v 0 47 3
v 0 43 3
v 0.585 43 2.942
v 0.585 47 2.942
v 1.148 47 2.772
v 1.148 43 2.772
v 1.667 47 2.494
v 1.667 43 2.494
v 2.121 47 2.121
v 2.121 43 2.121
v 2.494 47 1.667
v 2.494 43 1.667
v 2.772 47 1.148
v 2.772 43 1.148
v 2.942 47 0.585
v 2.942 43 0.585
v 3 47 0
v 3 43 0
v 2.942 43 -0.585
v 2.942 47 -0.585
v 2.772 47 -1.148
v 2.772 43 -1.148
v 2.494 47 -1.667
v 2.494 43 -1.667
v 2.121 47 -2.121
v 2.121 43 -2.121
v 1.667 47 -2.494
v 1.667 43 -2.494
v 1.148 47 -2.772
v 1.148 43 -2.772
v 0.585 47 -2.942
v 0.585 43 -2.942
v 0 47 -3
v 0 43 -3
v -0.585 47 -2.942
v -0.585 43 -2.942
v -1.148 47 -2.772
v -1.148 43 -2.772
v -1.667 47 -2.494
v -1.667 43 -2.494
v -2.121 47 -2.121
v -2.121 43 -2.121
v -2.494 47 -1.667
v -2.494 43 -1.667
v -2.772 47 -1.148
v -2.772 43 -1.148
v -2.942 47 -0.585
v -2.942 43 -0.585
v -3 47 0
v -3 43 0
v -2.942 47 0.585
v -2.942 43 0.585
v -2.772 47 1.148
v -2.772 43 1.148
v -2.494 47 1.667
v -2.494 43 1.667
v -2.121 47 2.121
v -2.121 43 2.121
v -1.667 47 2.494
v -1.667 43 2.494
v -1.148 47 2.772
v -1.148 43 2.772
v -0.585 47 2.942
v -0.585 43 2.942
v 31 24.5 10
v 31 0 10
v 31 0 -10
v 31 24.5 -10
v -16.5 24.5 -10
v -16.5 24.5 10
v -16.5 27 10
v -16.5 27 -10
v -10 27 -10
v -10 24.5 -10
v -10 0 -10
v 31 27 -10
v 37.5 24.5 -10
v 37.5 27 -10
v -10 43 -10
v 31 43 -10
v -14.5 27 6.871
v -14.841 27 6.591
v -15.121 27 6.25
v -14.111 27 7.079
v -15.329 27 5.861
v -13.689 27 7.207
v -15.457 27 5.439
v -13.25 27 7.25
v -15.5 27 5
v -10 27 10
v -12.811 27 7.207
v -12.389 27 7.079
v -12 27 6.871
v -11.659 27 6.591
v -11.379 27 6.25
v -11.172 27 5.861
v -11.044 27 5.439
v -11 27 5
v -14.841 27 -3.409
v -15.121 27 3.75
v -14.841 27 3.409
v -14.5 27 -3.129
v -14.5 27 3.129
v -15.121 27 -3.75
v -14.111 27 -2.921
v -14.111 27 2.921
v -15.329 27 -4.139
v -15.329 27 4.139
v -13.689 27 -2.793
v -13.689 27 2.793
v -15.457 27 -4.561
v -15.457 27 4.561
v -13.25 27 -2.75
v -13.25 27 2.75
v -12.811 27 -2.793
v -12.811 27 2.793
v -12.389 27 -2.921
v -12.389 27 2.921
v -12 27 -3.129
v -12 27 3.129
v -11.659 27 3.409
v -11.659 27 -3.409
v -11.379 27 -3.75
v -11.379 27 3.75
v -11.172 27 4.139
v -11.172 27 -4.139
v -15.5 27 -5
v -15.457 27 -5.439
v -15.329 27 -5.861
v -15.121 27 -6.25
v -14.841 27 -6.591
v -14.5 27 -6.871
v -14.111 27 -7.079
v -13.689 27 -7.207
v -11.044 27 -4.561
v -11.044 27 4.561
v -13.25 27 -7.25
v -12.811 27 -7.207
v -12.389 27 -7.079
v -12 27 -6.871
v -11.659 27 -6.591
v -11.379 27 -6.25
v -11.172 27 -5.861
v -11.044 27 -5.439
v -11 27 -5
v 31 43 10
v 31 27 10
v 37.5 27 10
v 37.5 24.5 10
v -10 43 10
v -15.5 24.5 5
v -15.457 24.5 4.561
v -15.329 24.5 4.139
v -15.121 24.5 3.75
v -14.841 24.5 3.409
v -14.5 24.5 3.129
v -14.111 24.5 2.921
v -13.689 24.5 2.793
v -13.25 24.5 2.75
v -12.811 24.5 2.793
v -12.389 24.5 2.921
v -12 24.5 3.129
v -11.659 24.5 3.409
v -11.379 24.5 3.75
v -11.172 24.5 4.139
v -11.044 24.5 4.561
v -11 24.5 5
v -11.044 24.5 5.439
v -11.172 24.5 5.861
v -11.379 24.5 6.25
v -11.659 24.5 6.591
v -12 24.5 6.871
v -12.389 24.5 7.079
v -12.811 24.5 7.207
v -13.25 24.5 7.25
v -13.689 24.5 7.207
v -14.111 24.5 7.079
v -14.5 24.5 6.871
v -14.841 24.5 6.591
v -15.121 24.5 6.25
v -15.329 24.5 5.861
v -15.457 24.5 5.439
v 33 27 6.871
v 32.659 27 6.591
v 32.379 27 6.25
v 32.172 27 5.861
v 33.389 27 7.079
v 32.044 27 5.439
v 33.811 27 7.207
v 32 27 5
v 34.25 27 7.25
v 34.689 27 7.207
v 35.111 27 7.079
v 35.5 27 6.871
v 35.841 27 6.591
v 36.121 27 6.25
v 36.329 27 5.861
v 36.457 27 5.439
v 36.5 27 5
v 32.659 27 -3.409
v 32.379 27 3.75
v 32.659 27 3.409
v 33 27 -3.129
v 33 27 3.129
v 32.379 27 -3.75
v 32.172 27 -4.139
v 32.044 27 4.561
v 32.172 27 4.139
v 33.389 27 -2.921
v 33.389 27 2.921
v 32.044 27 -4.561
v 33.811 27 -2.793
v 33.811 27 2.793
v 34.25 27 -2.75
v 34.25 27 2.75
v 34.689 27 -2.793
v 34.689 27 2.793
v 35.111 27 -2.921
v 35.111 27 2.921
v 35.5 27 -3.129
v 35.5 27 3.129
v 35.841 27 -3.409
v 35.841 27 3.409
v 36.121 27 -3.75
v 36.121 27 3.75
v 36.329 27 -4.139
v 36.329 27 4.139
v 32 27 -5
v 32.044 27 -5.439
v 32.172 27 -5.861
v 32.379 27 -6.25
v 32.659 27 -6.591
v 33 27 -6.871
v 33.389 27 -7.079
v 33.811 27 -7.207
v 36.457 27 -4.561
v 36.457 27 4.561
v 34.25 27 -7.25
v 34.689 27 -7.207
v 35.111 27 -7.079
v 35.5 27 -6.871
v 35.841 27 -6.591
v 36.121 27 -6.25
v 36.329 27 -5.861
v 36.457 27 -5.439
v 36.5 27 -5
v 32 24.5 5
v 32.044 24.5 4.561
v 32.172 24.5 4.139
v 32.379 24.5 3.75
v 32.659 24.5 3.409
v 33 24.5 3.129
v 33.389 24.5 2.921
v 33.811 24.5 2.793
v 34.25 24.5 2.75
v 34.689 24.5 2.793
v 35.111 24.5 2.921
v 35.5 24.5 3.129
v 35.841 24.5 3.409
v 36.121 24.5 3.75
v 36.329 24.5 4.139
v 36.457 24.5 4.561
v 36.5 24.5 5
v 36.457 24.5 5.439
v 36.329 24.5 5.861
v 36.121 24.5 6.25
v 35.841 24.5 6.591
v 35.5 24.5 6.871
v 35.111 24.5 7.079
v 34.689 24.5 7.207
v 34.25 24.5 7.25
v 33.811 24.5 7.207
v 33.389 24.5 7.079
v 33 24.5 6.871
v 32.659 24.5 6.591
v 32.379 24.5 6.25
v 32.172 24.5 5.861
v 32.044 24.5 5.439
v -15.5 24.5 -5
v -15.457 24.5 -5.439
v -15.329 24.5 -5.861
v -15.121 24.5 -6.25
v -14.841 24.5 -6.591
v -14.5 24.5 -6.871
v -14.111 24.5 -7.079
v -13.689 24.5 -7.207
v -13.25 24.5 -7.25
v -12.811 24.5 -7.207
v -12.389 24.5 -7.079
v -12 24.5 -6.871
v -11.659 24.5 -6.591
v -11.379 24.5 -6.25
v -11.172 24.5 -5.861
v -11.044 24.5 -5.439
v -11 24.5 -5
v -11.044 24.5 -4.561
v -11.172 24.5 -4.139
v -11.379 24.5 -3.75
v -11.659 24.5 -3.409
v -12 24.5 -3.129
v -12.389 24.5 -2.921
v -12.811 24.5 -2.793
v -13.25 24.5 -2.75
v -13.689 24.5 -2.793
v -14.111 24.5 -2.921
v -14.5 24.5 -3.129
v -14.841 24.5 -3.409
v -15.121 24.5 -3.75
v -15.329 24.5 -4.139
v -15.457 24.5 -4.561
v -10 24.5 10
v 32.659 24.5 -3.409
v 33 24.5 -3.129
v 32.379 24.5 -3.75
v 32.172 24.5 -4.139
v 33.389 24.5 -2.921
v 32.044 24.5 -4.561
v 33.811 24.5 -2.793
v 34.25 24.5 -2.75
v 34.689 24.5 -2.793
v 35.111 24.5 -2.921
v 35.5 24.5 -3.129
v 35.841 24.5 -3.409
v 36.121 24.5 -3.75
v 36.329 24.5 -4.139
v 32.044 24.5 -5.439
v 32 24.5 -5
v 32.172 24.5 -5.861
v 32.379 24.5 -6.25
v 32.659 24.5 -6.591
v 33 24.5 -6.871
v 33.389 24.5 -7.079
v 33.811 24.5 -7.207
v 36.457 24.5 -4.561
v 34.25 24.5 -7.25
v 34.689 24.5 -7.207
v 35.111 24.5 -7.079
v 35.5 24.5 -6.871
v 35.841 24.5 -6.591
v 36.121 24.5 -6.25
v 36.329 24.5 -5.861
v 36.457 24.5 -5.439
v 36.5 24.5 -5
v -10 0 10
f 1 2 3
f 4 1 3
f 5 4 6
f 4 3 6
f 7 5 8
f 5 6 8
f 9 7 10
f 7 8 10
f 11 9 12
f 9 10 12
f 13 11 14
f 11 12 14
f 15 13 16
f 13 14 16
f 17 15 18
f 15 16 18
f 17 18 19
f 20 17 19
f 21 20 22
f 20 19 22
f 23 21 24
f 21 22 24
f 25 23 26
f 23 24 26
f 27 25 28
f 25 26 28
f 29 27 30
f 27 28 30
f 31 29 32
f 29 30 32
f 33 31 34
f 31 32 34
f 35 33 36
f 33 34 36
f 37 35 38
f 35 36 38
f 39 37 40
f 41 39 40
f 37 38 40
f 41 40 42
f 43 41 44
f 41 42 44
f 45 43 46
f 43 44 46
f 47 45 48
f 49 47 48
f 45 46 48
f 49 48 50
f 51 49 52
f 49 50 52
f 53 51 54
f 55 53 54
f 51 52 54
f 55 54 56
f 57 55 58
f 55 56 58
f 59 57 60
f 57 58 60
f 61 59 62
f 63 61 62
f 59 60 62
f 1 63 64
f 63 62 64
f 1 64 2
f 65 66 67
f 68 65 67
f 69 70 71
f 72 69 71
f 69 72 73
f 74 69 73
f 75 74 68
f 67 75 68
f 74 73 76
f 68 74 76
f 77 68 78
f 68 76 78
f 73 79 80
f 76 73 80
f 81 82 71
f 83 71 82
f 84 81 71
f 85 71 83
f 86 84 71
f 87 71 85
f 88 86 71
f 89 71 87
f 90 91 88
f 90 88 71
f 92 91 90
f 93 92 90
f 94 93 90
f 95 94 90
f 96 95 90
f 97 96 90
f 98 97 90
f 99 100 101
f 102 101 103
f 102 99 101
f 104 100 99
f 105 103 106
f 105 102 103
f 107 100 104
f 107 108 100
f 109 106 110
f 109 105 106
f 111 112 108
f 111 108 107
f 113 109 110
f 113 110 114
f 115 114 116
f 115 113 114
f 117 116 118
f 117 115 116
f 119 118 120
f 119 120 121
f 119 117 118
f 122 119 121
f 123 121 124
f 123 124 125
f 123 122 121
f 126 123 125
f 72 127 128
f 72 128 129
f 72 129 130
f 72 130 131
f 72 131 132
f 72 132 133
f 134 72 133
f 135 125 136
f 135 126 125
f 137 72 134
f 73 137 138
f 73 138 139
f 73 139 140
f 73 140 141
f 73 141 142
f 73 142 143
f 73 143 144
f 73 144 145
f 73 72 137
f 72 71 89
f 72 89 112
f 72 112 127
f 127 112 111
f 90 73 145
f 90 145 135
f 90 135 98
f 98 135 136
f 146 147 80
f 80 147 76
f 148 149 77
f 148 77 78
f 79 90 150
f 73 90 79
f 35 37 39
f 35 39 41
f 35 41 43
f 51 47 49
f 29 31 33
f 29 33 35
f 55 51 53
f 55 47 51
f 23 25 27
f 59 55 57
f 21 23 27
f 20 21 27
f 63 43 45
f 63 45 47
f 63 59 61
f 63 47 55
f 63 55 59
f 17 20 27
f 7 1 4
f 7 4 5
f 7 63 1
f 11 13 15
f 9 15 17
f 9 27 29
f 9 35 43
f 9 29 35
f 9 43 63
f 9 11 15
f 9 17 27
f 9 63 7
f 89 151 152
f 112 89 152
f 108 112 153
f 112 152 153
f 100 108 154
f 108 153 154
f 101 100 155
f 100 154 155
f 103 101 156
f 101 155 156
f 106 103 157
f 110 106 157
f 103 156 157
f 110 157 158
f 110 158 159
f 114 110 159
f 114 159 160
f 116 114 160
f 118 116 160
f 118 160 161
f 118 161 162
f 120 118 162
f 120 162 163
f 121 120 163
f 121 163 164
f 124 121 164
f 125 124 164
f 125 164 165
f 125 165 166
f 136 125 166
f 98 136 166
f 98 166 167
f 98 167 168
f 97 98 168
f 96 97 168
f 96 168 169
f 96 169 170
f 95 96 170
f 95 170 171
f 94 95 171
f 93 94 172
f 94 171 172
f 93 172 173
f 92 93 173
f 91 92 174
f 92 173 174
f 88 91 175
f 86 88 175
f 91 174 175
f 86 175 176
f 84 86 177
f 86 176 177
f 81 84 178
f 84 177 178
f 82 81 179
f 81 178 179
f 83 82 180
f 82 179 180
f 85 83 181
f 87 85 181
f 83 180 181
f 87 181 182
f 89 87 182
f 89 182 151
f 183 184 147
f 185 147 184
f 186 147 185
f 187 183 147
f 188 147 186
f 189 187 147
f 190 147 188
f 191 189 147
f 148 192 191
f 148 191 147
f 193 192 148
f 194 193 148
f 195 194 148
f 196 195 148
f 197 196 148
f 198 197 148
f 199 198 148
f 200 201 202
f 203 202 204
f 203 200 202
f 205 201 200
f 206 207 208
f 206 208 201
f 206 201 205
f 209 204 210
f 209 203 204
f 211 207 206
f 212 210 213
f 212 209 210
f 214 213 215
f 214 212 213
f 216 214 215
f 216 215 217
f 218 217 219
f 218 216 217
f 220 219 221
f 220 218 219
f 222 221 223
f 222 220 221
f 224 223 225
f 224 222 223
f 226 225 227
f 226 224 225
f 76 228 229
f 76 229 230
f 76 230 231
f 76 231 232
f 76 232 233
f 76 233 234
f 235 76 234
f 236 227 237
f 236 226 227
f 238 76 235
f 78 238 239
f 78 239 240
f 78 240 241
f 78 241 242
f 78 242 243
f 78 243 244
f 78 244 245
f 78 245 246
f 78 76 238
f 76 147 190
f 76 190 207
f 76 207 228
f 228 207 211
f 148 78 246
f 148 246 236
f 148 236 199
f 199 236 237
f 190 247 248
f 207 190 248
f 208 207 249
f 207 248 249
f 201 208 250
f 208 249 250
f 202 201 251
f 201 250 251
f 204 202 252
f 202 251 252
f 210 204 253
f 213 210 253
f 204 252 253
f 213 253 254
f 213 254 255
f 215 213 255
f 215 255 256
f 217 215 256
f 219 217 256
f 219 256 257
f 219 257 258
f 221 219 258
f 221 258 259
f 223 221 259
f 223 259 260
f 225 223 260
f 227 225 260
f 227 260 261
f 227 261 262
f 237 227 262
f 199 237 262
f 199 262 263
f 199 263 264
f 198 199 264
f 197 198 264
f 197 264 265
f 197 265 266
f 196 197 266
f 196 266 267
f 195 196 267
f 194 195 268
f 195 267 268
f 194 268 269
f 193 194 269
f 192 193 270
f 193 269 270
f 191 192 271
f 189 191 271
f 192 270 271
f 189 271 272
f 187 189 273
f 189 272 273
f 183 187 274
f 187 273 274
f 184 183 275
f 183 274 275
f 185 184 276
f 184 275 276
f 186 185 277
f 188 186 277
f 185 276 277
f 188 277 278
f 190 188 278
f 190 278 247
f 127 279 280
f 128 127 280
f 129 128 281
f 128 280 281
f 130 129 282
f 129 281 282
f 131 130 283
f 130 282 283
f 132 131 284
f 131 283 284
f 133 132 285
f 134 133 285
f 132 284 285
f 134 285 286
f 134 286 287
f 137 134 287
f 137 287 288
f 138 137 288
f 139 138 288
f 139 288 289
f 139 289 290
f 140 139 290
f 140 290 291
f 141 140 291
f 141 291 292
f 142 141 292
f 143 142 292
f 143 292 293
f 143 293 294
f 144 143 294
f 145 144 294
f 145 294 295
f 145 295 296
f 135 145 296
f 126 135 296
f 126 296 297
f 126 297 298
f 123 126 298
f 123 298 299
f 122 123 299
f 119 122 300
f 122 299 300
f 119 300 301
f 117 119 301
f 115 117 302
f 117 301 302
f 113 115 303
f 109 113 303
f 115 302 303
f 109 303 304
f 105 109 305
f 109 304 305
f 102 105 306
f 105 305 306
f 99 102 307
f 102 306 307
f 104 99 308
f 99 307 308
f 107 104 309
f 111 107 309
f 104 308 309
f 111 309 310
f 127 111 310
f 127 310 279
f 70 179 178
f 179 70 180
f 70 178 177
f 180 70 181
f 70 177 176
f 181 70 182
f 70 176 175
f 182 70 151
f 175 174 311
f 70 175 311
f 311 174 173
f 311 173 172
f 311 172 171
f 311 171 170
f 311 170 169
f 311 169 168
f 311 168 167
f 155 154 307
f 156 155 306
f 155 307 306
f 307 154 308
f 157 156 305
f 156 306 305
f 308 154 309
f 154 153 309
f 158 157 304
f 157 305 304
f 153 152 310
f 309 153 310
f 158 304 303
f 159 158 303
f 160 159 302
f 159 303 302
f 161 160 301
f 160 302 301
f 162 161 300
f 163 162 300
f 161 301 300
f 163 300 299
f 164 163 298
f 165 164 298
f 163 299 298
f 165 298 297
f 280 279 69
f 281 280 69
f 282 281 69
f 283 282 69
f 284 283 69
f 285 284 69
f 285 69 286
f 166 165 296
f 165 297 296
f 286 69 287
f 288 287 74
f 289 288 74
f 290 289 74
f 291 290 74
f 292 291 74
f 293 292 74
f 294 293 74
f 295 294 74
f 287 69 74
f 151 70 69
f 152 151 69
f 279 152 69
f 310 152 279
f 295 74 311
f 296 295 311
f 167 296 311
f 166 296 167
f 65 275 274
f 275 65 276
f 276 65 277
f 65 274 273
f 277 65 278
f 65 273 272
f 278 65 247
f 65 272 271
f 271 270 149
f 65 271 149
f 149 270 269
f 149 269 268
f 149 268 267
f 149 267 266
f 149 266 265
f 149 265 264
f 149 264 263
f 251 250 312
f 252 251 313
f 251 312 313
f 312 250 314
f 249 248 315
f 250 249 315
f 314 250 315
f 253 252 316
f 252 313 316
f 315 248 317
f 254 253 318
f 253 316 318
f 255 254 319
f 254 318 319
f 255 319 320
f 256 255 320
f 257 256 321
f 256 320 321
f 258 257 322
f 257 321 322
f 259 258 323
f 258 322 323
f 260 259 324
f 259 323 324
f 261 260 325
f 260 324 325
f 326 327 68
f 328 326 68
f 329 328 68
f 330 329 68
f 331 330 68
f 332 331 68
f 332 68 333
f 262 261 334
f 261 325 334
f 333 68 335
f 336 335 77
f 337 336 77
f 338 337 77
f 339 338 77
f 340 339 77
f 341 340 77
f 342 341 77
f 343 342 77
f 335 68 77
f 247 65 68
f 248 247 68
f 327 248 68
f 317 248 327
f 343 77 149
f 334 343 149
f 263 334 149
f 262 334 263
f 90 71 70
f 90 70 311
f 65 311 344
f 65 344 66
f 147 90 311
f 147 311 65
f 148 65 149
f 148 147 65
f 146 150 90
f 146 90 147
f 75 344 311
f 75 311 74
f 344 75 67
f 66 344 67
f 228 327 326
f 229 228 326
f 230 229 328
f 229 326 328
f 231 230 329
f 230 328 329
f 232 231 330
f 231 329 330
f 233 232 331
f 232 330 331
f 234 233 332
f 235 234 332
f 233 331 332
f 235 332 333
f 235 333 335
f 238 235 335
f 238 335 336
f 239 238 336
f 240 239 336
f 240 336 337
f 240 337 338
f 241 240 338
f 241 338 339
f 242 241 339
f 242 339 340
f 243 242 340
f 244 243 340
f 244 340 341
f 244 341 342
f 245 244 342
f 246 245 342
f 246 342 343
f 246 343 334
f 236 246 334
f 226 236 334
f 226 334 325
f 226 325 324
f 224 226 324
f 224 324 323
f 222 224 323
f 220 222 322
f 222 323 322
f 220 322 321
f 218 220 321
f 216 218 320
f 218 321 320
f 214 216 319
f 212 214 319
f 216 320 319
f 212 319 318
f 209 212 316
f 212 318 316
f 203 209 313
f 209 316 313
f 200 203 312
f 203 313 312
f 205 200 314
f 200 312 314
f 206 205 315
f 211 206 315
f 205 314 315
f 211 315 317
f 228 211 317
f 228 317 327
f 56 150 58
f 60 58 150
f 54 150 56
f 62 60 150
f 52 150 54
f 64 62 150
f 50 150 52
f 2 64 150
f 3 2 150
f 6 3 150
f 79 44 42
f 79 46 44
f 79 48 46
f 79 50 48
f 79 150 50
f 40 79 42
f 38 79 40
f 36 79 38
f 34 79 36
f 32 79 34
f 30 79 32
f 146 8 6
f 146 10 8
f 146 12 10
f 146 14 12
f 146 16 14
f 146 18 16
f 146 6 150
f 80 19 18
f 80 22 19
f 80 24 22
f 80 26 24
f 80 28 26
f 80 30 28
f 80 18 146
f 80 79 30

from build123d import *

# Parameters (mm, degrees)
SCHIZZO1_W                        = 41
SCHIZZO1_H                        = 20
ESTRUSIONE_ESTRUSIONE1_DEPTH      = 43
SCHIZZO2_R                        = 3
ESTRUSIONE_ESTRUSIONE4_DEPTH      = 4
ESTRUSIONE_ESTRUSIONE5_DEPTH      = 10
ESTRUSIONE_ESTRUSIONE5_DEPTH_BACK = 10
SCHIZZO4_W                        = 54
SCHIZZO4_H                        = 2.5
FORO_PER_VITE_M1_6_1_D            = 4.5


with BuildPart() as part:
    # Schizzo1 → Estrusione-Estrusione1 (new body)
    with BuildSketch(Plane(origin=(0, 0, 0), x_dir=(1, 0, 0), z_dir=(0, 1, 0))):
        with Locations((10.5, 0)):
            Rectangle(SCHIZZO1_W, SCHIZZO1_H)
    extrude(amount=ESTRUSIONE_ESTRUSIONE1_DEPTH)

    # Schizzo2 → Estrusione-Estrusione4 (add)
    with BuildSketch(Plane(origin=(0, 43, 0), x_dir=(1, 0, 0), z_dir=(0, 1, 0))):
        Circle(SCHIZZO2_R)
    extrude(amount=ESTRUSIONE_ESTRUSIONE4_DEPTH)

    # Schizzo4 → Estrusione-Estrusione5 (add, two sides: drawn at the far end of the back side and taken through both)
    with BuildSketch(Plane.XY.offset(-ESTRUSIONE_ESTRUSIONE5_DEPTH_BACK)):
        with Locations((10.5, 25.75)):
            Rectangle(SCHIZZO4_W, SCHIZZO4_H)
    extrude(amount=ESTRUSIONE_ESTRUSIONE5_DEPTH + ESTRUSIONE_ESTRUSIONE5_DEPTH_BACK)

    # Foro per Vite M1.6-1 (through all)
    with Locations(Plane(origin=(0, 27, 0), x_dir=(1, 0, 0), z_dir=(0, 1, 0))):
        with Locations((-13.250292536, 5), (-13.250292536, -5), (34.250292536, 5), (34.250292536, -5)):
            Hole(FORO_PER_VITE_M1_6_1_D / 2)


solid = part.part
